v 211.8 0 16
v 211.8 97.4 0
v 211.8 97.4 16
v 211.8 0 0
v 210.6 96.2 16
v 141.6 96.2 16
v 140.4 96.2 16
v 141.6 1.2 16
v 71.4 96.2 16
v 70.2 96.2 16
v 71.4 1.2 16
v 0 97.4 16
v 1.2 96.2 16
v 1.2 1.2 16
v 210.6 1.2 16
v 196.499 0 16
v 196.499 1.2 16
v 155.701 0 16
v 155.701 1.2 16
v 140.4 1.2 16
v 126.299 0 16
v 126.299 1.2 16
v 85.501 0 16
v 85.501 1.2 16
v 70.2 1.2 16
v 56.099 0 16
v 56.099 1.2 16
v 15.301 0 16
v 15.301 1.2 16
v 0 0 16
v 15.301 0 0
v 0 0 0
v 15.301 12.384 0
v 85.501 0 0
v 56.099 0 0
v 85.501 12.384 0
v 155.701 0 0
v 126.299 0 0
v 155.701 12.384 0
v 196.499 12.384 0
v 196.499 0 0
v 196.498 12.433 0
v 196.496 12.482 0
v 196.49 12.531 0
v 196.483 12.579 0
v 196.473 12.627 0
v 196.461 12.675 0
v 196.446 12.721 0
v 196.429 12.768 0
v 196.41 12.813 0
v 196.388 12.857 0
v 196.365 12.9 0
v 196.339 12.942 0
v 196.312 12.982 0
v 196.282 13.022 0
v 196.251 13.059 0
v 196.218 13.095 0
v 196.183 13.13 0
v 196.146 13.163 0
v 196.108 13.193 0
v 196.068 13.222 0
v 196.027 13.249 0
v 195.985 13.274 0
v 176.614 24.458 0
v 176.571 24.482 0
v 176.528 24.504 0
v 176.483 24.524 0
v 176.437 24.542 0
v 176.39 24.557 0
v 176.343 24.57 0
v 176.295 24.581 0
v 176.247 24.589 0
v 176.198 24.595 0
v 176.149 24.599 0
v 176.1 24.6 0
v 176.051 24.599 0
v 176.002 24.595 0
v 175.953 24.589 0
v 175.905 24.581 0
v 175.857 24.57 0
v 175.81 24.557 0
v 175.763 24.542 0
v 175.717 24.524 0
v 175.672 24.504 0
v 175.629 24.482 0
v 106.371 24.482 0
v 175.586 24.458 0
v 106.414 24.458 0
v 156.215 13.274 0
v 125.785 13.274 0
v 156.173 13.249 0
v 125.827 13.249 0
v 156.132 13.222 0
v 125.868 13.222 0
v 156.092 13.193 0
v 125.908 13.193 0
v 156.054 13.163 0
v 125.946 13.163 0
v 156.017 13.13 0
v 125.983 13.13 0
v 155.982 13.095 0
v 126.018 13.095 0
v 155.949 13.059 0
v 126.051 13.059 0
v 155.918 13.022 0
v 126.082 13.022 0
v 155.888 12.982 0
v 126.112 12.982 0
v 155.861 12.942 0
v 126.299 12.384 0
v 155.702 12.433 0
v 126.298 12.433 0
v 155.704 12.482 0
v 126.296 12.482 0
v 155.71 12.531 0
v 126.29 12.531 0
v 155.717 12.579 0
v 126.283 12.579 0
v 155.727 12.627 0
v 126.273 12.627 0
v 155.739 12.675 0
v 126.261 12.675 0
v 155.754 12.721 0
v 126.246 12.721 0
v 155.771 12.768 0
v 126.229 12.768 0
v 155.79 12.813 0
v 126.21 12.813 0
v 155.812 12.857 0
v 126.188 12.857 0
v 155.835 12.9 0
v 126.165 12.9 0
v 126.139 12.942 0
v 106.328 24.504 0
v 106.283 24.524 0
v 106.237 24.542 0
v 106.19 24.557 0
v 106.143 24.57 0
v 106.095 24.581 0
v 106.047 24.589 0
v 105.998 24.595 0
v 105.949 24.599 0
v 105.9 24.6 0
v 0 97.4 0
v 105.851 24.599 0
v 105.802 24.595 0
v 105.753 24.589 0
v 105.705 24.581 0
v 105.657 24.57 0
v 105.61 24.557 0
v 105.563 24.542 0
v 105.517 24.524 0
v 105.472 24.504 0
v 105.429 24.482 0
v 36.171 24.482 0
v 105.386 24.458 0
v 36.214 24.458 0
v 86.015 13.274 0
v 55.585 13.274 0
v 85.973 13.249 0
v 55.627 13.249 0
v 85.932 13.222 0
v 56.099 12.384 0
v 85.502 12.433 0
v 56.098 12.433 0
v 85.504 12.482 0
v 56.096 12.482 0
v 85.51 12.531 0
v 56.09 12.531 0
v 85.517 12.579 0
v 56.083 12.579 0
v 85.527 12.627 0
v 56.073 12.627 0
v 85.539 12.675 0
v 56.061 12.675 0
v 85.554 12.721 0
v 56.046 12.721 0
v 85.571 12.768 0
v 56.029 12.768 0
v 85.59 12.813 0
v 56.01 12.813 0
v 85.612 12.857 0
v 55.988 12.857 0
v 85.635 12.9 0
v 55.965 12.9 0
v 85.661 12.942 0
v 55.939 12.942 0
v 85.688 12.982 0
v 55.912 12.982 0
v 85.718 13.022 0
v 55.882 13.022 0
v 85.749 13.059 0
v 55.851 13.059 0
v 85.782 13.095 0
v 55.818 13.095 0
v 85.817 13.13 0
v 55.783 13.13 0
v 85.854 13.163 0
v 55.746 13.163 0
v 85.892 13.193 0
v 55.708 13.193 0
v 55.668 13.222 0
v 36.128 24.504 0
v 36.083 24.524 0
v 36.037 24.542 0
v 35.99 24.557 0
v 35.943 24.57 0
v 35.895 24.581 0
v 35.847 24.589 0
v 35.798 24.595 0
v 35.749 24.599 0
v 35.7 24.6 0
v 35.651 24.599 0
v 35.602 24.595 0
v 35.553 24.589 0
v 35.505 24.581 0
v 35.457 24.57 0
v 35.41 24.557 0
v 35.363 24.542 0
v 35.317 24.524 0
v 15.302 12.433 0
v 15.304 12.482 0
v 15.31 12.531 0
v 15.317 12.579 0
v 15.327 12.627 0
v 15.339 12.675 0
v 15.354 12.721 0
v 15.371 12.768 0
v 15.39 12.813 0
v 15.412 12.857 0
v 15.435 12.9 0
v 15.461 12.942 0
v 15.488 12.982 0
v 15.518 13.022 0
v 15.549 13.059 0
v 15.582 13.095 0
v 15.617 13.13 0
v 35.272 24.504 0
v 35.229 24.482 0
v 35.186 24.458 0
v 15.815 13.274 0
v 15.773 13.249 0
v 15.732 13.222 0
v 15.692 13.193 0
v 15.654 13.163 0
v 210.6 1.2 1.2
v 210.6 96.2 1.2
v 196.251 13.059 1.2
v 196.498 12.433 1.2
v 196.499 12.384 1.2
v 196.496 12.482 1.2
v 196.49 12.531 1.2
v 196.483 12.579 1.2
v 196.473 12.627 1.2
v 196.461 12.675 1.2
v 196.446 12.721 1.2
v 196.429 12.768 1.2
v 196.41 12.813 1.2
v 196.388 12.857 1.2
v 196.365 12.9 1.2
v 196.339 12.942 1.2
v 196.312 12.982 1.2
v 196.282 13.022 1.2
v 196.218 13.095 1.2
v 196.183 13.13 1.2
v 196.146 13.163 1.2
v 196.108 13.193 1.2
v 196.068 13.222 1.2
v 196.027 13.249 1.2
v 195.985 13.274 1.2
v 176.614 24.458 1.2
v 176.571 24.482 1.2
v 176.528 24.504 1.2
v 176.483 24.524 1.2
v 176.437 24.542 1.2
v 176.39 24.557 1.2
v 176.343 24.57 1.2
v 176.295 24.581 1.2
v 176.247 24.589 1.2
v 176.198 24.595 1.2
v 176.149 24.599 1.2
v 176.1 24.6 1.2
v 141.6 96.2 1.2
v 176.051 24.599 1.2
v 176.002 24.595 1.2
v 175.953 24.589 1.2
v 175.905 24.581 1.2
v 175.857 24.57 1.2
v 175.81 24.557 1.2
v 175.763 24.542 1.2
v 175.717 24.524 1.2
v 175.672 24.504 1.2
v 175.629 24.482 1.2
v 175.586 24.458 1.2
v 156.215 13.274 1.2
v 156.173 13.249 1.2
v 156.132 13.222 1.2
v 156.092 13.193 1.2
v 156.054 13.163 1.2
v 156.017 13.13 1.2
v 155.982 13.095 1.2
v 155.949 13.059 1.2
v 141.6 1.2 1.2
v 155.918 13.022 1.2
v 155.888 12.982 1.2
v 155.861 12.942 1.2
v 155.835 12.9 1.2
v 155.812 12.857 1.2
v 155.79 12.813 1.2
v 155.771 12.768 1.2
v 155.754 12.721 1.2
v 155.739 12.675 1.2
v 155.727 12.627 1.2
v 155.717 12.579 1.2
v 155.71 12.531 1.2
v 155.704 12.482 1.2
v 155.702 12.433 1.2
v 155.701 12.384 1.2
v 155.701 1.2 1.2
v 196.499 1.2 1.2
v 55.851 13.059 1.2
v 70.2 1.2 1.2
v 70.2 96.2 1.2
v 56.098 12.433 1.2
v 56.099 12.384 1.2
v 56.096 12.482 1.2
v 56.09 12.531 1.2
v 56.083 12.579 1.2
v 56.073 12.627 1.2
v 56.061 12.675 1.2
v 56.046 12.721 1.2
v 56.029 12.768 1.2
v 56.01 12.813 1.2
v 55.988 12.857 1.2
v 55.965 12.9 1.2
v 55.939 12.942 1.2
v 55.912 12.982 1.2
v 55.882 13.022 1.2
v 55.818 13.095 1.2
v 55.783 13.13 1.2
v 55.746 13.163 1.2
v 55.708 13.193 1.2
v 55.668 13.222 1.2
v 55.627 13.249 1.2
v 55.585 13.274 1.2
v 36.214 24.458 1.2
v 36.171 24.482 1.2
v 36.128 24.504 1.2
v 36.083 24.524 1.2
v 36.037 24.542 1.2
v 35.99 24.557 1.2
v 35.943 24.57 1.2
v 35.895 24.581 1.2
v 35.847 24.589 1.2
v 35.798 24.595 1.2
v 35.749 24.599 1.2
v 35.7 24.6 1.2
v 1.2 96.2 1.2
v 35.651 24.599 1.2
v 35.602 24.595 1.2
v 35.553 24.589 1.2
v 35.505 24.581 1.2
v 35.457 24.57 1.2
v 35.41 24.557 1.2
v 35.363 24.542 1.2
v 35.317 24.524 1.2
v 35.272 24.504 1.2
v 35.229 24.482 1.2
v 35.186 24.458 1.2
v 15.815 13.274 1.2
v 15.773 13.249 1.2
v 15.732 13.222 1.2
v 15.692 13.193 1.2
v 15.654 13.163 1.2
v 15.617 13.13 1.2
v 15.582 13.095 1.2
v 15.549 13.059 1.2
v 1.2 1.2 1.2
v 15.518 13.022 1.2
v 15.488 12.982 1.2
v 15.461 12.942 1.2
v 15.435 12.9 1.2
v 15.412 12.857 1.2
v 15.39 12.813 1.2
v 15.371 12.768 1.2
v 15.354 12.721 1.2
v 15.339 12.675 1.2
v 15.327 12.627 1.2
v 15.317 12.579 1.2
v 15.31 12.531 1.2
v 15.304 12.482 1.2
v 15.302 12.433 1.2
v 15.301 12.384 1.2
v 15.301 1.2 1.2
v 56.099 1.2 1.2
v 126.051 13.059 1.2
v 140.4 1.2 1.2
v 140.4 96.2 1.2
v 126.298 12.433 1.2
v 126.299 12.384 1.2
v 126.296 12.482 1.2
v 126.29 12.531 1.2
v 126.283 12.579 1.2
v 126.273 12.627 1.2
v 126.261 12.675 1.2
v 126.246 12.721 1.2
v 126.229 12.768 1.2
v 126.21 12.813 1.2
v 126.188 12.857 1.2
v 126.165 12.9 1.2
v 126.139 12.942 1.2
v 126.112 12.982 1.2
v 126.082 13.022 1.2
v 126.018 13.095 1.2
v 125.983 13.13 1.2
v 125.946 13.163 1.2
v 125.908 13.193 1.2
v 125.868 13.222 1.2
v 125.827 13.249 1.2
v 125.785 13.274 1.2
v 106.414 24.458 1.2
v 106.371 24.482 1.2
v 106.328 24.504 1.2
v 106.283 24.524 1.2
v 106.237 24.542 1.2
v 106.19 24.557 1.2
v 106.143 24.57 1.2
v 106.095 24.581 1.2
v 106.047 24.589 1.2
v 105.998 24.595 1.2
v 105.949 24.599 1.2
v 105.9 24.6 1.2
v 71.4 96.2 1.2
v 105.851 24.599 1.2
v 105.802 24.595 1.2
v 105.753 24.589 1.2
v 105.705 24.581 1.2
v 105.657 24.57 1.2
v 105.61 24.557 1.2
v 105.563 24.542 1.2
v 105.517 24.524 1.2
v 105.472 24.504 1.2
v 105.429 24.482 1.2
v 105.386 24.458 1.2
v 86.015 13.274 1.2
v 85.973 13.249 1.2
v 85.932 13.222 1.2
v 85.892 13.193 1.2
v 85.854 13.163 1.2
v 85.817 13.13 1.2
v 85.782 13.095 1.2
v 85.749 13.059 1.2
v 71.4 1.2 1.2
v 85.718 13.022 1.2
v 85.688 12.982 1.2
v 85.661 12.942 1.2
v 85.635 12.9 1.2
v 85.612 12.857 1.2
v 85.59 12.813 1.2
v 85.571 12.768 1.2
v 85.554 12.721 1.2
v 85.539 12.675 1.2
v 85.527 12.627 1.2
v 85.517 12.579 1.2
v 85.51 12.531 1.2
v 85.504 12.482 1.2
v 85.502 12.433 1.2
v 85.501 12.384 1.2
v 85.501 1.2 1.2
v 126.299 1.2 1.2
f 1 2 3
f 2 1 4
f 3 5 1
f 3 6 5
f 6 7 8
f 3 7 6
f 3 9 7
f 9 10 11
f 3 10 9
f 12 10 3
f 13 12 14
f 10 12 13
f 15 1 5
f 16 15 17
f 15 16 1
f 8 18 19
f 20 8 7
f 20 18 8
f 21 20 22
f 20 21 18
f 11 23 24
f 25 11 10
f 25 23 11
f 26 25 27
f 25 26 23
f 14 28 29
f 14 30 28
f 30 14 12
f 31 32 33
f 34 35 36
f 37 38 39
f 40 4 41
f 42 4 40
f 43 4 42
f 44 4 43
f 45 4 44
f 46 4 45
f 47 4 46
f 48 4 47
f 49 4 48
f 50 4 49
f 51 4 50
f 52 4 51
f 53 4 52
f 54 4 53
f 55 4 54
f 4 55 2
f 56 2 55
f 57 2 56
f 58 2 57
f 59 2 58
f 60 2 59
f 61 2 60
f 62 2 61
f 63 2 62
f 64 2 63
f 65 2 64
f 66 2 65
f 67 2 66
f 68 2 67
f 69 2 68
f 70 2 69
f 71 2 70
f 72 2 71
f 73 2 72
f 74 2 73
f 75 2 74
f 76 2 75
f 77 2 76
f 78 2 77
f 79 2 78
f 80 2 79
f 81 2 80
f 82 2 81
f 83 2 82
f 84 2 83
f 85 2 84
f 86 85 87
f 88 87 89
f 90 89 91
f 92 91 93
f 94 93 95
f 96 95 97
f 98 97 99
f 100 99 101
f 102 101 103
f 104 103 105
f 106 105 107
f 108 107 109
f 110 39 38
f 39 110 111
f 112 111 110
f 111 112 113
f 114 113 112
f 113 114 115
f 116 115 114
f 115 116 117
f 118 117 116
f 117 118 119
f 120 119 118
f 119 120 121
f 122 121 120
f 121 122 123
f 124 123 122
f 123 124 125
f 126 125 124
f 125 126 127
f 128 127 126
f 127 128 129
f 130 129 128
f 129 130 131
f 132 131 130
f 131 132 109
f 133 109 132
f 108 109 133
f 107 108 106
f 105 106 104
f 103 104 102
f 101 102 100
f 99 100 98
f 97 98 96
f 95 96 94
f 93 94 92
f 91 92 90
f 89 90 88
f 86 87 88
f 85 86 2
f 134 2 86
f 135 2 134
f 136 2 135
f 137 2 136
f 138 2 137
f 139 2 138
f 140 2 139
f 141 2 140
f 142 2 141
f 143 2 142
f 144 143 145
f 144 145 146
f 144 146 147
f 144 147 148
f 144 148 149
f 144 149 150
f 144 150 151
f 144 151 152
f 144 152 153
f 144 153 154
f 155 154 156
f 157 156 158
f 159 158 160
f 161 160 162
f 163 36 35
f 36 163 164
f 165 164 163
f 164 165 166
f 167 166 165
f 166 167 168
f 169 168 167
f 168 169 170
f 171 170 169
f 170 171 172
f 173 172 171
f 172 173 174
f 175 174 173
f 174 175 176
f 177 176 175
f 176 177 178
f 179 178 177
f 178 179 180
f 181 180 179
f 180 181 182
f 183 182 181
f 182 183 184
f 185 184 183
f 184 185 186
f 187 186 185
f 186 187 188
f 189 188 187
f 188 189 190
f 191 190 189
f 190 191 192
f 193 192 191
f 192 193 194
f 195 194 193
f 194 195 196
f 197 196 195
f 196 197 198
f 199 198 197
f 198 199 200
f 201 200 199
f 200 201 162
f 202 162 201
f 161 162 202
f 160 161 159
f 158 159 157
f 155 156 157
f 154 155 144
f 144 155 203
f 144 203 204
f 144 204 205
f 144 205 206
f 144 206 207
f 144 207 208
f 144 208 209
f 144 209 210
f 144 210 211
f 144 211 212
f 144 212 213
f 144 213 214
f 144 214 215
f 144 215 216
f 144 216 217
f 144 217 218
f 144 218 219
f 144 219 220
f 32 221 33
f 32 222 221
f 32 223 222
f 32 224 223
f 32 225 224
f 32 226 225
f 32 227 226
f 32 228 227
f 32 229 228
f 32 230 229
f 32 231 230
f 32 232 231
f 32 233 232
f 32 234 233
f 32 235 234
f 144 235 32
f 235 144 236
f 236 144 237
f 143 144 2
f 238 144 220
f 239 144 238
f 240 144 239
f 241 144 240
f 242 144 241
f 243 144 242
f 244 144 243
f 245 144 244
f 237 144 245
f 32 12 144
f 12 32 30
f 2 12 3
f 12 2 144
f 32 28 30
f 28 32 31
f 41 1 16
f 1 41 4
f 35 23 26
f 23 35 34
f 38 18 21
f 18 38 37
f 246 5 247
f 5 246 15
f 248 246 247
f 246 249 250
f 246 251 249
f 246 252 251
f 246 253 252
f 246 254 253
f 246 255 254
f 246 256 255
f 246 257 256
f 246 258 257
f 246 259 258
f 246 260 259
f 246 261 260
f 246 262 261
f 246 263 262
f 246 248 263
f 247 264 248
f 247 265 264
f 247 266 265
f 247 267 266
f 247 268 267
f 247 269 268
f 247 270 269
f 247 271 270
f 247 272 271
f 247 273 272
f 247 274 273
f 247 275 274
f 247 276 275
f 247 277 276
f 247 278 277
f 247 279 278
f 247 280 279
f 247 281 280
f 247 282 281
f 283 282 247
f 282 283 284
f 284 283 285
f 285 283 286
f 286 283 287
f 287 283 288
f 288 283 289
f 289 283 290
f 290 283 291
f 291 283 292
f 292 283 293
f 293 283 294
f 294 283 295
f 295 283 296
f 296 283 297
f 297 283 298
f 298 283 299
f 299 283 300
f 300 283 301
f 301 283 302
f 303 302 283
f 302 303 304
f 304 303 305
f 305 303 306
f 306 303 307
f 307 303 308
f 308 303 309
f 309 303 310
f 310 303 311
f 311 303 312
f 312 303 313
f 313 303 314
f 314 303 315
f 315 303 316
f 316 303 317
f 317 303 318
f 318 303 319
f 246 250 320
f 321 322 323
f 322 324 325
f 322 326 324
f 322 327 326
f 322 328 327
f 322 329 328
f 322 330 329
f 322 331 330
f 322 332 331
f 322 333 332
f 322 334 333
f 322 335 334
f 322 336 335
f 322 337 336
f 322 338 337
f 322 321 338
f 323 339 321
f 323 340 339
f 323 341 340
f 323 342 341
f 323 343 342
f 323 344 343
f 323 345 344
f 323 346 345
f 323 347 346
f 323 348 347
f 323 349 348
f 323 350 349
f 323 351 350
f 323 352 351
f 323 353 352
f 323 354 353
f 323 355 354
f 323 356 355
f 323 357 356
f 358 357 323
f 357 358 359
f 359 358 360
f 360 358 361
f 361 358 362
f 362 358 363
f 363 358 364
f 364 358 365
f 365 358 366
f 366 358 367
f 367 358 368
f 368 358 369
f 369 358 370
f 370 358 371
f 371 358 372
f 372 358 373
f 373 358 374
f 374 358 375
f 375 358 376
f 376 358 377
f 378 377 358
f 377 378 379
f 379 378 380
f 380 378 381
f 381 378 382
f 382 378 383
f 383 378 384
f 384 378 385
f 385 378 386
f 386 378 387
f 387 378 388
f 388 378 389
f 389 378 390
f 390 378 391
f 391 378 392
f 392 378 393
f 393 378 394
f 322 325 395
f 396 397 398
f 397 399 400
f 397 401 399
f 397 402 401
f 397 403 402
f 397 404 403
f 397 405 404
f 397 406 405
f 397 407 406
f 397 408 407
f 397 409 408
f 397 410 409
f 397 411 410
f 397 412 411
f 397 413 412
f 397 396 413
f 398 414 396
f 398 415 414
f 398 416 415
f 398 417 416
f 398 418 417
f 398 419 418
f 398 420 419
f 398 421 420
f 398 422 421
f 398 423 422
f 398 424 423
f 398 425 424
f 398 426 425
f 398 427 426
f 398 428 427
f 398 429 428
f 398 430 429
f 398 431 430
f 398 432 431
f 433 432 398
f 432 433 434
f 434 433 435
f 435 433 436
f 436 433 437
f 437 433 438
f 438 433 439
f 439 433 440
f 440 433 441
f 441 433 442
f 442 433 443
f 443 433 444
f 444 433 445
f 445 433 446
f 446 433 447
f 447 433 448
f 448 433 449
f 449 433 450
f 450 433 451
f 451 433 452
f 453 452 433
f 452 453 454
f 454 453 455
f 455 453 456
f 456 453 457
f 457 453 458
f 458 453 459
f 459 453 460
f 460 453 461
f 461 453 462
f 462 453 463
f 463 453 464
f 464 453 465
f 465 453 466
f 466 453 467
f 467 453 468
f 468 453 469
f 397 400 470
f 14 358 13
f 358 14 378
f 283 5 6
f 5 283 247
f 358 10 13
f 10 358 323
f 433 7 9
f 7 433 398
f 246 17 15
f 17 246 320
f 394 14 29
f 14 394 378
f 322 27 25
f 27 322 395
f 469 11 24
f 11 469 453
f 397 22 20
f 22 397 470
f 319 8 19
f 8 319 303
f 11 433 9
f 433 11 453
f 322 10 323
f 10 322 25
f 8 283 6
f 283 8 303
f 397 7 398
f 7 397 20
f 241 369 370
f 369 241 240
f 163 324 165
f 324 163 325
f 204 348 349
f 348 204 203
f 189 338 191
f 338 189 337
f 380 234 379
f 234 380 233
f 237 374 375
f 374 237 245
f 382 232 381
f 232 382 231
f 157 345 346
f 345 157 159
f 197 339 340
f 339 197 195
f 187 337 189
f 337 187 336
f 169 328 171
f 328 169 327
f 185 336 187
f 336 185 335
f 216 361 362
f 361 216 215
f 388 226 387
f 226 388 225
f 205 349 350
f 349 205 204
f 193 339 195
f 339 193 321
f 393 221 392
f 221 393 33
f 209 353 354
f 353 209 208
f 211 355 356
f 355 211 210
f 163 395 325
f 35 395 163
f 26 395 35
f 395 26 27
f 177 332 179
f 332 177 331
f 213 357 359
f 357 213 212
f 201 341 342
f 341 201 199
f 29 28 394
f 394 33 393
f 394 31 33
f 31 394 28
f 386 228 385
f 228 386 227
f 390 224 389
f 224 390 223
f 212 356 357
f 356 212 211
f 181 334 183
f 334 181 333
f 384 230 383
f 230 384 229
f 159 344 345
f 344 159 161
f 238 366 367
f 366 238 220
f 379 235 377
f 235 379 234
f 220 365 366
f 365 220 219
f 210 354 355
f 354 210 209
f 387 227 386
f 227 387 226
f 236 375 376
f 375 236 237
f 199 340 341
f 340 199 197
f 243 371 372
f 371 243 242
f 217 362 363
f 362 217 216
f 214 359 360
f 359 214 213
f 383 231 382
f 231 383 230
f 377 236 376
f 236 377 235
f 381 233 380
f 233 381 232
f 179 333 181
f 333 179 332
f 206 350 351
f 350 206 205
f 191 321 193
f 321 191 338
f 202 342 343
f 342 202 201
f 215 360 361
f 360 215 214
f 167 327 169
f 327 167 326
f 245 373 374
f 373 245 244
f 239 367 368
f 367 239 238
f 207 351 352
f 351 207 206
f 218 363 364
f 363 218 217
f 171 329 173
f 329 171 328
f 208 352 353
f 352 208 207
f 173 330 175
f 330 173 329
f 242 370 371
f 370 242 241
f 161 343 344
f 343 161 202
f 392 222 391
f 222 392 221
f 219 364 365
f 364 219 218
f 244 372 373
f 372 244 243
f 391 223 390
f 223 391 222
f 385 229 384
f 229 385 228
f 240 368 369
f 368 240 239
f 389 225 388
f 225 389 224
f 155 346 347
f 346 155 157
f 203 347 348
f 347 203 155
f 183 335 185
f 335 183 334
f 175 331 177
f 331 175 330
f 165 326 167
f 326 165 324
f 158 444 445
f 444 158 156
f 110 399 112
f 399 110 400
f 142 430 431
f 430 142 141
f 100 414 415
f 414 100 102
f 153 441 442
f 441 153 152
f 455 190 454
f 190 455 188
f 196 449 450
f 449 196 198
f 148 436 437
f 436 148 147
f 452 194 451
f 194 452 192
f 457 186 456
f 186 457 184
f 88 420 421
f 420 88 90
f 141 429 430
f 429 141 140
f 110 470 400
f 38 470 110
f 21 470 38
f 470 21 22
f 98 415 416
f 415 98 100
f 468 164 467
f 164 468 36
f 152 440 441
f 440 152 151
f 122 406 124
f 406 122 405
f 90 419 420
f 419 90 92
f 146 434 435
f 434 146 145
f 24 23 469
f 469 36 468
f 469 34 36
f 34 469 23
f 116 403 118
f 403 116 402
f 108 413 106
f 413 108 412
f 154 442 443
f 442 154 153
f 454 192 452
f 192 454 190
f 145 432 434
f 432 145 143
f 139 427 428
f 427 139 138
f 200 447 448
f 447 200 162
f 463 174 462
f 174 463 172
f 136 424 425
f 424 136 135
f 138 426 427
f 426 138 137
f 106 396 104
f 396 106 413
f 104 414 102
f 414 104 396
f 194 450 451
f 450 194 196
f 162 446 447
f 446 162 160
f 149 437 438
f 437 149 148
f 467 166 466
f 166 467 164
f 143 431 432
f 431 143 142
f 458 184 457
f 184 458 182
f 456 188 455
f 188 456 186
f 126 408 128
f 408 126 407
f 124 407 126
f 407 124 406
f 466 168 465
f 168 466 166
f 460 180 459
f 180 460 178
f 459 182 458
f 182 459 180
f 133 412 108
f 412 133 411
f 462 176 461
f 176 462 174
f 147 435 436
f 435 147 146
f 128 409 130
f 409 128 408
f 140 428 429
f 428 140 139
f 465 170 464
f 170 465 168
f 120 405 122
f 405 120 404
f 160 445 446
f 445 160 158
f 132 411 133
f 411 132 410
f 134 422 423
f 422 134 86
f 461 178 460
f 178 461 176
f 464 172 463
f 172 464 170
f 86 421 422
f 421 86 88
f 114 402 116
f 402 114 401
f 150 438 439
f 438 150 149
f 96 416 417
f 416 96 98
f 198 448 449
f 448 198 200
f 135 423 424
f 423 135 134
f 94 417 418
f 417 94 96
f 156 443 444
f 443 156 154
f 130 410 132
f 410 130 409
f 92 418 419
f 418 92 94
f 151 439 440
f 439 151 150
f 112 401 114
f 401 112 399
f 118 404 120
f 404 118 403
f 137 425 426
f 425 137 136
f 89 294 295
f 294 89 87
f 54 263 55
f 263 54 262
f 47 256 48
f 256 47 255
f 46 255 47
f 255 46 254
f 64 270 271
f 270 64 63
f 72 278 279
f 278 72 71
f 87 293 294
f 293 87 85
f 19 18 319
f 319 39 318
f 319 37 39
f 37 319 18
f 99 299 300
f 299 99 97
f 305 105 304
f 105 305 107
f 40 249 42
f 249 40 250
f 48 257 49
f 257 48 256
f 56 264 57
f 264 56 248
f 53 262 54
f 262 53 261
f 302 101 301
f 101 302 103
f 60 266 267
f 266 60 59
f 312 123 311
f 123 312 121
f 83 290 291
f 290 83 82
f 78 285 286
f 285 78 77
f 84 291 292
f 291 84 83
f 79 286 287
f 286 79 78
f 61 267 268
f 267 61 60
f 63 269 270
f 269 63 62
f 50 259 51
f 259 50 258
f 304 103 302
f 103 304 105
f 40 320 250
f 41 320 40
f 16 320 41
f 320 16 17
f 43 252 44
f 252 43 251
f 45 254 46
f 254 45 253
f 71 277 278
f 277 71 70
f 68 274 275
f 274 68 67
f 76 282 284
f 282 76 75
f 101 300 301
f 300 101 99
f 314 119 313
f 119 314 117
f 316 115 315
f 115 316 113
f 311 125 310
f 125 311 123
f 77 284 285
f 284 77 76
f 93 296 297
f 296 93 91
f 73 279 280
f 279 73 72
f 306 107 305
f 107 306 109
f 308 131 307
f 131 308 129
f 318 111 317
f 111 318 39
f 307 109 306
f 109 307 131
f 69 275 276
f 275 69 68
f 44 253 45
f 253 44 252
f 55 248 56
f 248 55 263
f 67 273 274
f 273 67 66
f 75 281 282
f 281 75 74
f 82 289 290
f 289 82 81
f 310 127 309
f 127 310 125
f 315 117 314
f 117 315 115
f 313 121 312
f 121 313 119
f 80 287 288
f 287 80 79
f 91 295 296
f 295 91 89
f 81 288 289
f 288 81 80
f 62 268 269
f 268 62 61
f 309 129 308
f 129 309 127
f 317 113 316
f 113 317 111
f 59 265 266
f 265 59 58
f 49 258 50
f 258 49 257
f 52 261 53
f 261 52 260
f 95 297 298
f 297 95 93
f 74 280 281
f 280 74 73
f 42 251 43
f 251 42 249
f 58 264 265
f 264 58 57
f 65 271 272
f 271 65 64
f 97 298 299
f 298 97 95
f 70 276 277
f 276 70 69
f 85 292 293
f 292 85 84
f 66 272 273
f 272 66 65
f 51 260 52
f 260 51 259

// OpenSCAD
// file: ../../internal/tray.scad
// Copyright 2023 Joshua Star, All Rights Reserved

include <base.scad>
include <prim.scad>

module tray_basic(inner_size, r=0, thickness=DEFAULT_THICKNESS, bottom_thickness=undef) {

	half_z = inner_size.z / 2;
	radius = min(r, half_z);

	bottom_thk = bottom_thickness != undef ? bottom_thickness : thickness;

	thk2 = thickness * 2;

	outer_size = inner_size + [thk2, thk2, bottom_thk];
	echo("tray outer dimensions are: ", outer_size);

	inner_radius = radius - thickness;

	union() {
		difference() {
			// outer shell
			if (0 < r) {
				union() {
					translate([0, 0, bottom_thk])
						cylinder_cube([outer_size.x, outer_size.y, outer_size.z - bottom_thk], r=radius);
					cylinder_cube([outer_size.x, outer_size.y, bottom_thk], inner_radius, radius);
				}
			}
			else {
				cube(outer_size);
			}
			
			// lip cutout
			if (0 < radius) {
				translate([0, 0, inner_size.z + SMALL_NUM])
					cylinder_cube([outer_size.x, outer_size.y, bottom_thk], r1=inner_radius, r2=radius);
			}

			// inner cutout
			if (0 < radius) {
				translate([thickness, thickness, bottom_thk])
					rounded_cube(inner_size + [0, 0, bottom_thk], r=inner_radius, flat_top=true);
			}
			else {
				translate([thickness, thickness, bottom_thk])
						cube(inner_size + [0, 0, bottom_thk]);
			}
		}
	}
}

module tray_divided(size, r=0, div_x=1, div_y=1, thickness=DEFAULT_THICKNESS, bottom_thickness=undef, div_height=undef, div_thickness=undef) {

	bottom_thk = bottom_thickness != undef ? bottom_thickness : thickness;

	div_thk = div_thickness != undef ? div_thickness : thickness;
	div_z = div_height != undef ? div_height : size.z;

	max_div_z = 0 == r ? size.z : size.z - bottom_thk;
	clamped_div_z = min(div_z, max_div_z);

	x_minus_div = size.x - (div_thk * (div_x - 1));
	y_minus_div = size.y - (div_thk * (div_y - 1));

	x_off = (x_minus_div / div_x) + div_thk;
	y_off = (y_minus_div / div_y) + div_thk;
	
	union() {
		tray_basic(size, r=r, thickness=thickness, bottom_thickness=bottom_thk);

		// columns, along x
		for (i=[1:1:div_x-1]) {
			translate([i * x_off, thickness, bottom_thk])
				cube([div_thk, size.y, clamped_div_z]);
		}

		// rows, along y
		for (i=[1:1:div_y-1]) {
			translate([thickness, i * y_off, bottom_thk])
				cube([size.x, div_thk, clamped_div_z]);
		}
	}
}

module notch_cutter(h, r) {
	n = 6;
	rotate([0, 0, 180 / n]) cylinder_ngon(2 * r, h, n);
}

module tray_notched(size, div_x=1, div_y=1, thickness=DEFAULT_THICKNESS, bottom_thickness=undef, div_height=undef, div_thickness=undef, notch_lo_x=true, notch_hi_x=true) {

	bottom_thk = bottom_thickness != undef ? bottom_thickness : thickness;

	div_thk = div_thickness != undef ? div_thickness : thickness;
	div_z = div_height != undef ? div_height : size.z;

	x_minus_div = size.x - (div_thk * (div_x - 1));

	x_off = (x_minus_div / div_x) + div_thk;
	
	div_bias = (div_thk - x_off) / 2;

	notch_h = size.z + bottom_thk + 2 * SMALL_NUM;
	notch_r = x_off / 3;

	difference() {
		tray_divided(size, div_x=div_x, div_y=div_y, thickness=thickness, bottom_thickness=bottom_thk, div_height=div_z, div_thickness=div_thk);

		// notch along x
		for (i=[1:1:div_x]) {

			if (notch_lo_x) {
				translate([i * x_off + div_bias, thickness, -SMALL_NUM])
					notch_cutter(notch_h, notch_r);
			}

			if (notch_hi_x) {
				translate([i * x_off + div_bias, size.y + thickness, -SMALL_NUM])
					notch_cutter(notch_h, notch_r);
			}
		}
	}
}

// --- TESTING ---

//tray_basic([240, 120, 30], r=4);

//translate([-1.2, -1.2, 0]) tray_divided([200, 100, 5], div_x=20, div_y=10);
//tray_divided([180, 120, 30], r=15, div_x=3, div_y=2, div_height=25);

//translate([-1.2, -1.2, 0]) tray_notched([200, 100, 30], div_x=20, div_y=10);
// file: ../../internal/prim.scad
// Copyright 2023 Joshua Star, All Rights Reserved

module cylinder_cube(size, r1=1, r2=1, r=undef) {
	r1 = r != undef ? r : r1;
	r2 = r != undef ? r : r2;

	r_max = max(r1, r2);
	hull() {
		translate([r_max, r_max, 0])
			cylinder(size.z, r1, r2);
		translate([size.x - r_max, r_max, 0])
			cylinder(size.z, r1, r2);
		translate([r_max, size.y - r_max, 0])
			cylinder(size.z, r1, r2);
		translate([size.x - r_max, size.y - r_max, 0])
			cylinder(size.z, r1, r2);
	}
}

module cylinder_ngon(width, h, n=6, r=1) {
	hull() {
		for (i=[0:1:n-1]) {
			angl_off = 360 / n;
			posx_off = width / 2 - r;
			rotate([0, 0, i * angl_off]) translate([posx_off, 0, 0])
				cylinder(r=r, h=h);
		}
	}
}

module cylinder_trap(size, ratio, radius=1) {
	hull() {
		half_size_x = size.x / 2;
		translate([radius - half_size_x, radius, 0])
			cylinder(r=radius, h=size.z);
		translate([half_size_x - radius, radius, 0])
			cylinder(r=radius, h=size.z);
		translate([radius - ratio * half_size_x, size.y - radius, 0])
			cylinder(r=radius, h=size.z);
		translate([ratio * half_size_x - radius, size.y - radius, 0])
			cylinder(r=radius, h=size.z);
	}
}

module rounded_cube(size, r=1, flat_top=false) {
	
	half_z = size.z / 2;
	radius = min(r, half_z);
	
	hull() {
		// bottom 'points'
		translate([radius,radius,radius]) sphere(r=radius);
		translate([size.x-radius,radius,radius]) sphere(r=radius);
		translate([radius,size.y-radius,radius]) sphere(r=radius);
		translate([size.x-radius,size.y-radius,radius]) sphere(r=radius);

		// top 'points'
		pos_z = size.z - radius;
		if (flat_top) {
			translate([radius, radius, pos_z]) cylinder(r=radius, h=radius);
			translate([size.x-radius, radius, pos_z]) cylinder(r=radius, h=radius);
			translate([radius, size.y-radius, pos_z]) cylinder(r=radius, h=radius);
			translate([size.x-radius, size.y-radius, pos_z]) cylinder(r=radius, h=radius);
		}
		else {
			translate([radius, radius, pos_z]) sphere(r=radius);
			translate([size.x-radius, radius, pos_z]) sphere(r=radius);
			translate([radius, size.y-radius, pos_z]) sphere(r=radius);
			translate([size.x-radius, size.y-radius, pos_z]) sphere(r=radius);
		}
	}
}

// --- TESTING ---

//cylinder_cube([240, 120, 30], r=8);

//cylinder_cube([240, 120, 16], r1=4, r2=8);
//cylinder_cube([240, 120, 16], r1=8, r2=4);

//cylinder_ngon(10, 5, 7, 1);

//cylinder_trap([100, 50, 30], 0.5, radius=8);

//rounded_cube([240, 120, 30], r=12);
//rounded_cube([240, 120, 30], r=12, flat_top=true);
//rounded_cube([240, 120, 30], r=30, flat_top=true);
// file: ../../internal/math.scad
// Copyright 2023 Joshua Star, All Rights Reserved

function clamp(x, lower, upper) = x < lower ? lower : (upper < x ? upper : x);
function lerp(lower, upper, s) = (upper - lower) * s + lower;
// file: ../../internal/card.scad
// Copyright 2023 Joshua Star, All Rights Reserved

TOLERANCE_MIN = [0.4, 0.4];
TOLERANCE_MAX = [0.8, 0.8];

function std_card_dim() = [67, 93] + TOLERANCE_MIN; // gray
function amer_card_dim() = [59, 91] + TOLERANCE_MIN; // green
function euro_card_dim() = [62, 94] + TOLERANCE_MIN; // purple

function mini_amer_card_dim() = [44, 67] + TOLERANCE_MIN; // yellow
function mini_euro_card_dim() = [46, 71] + TOLERANCE_MIN; // ruby

function 7won_card_dim() = [67, 103] + TOLERANCE_MAX; // brown
function tarot_card_dim() = [73, 122] + TOLERANCE_MAX; // orange

function per_card_thickness() = 0.68;

function calc_card_stack(n, padding=1.2) = n * per_card_thickness() + padding;
function calc_card_count(d, padding=1.2) = (d - padding) / per_card_thickness();
// file: ../../internal/boxes.scad
// Copyright 2023 Joshua Star, All Rights Reserved

function gamebox_common() = [286, 286, 68]; // Terraforming Mars, Wingspan

function gamebox_ffg_10() = [254, 254, 48]; // Cave Troll, Drakon (4th ed), Elder Sign
function gamebox_ffg_11() = [290, 290, 70]; // 11.5 in.
function gamebox_ffg_revised_lcg() = [280, 238, 70]; // Marvel Champions
// file: ../../internal/base.scad
// Copyright 2023 Joshua Star, All Rights Reserved

fn = $preview ? 16 : 128;
$fn = fn;

SMALL_NUM = $preview ? 0.02 : 0.001;

DEFAULT_PADDING = 1.6;
DEFAULT_THICKNESS = 1.2;

function default_padding() = DEFAULT_PADDING;
function default_thickness() = DEFAULT_THICKNESS;

function make_list(v, n) = [for(i=[0:n-1]) v];
function sum_list(v) = [for(p=v) 1] * v;
// file: ../../boardgame_tk.scad
// Copyright 2023 Joshua Star, All Rights Reserved

include <internal/base.scad>
include <internal/boxes.scad>
include <internal/card.scad>
include <internal/math.scad>
include <internal/prim.scad>
include <internal/tray.scad>

module card_display(card_size, height, num_stacks, padding=DEFAULT_PADDING, thickness=DEFAULT_THICKNESS, bottom_thickness=undef, div_thickness=undef) {

	div_thk = div_thickness != undef ? div_thickness : thickness;

	dim_x = (card_size.x + padding) * num_stacks + (div_thk * (num_stacks - 1));
	dim_y = card_size.y + padding;
	dim_z = height;

	tray_notched([dim_x, dim_y, dim_z], div_x=num_stacks, thickness=thickness, bottom_thickness=bottom_thickness, div_thickness=div_thickness, notch_hi_x=false);
}

module vertical_cutter(size, r=0.5) {
	difference() {
		translate([0, size.z, 0]) rotate([90, 0, 0])
		linear_extrude(height=size.z) {
			translate([0, r, 0])
			offset(r=-r) {
				offset(r=2*r) {
					union() {
						translate([-(size.x + 2 * r) / 2, 0, 0]) square([size.x + 2 * r, 1]);
						translate([-(size.x - 2 * r)/2, -size.y, 0]) square([size.x - 2 * r, size.y]);
					}
				}
			}
		}

		translate([-(size.x + r), -size.z, 0])
			cube([2 * (size.x + r), 3 * size.z, 2 * (size.y + r)]);
	}
}

module card_tray(card_size, stacks, num_columns=1, padding=[0.8, 0.8, 0.8], thickness=DEFAULT_THICKNESS, bottom_thickness=undef, div_height=undef, div_thickness=undef) {

	bottom_thk = bottom_thickness != undef ? bottom_thickness : thickness;

	div_thk = div_thickness != undef ? div_thickness : thickness;

	col_dim_x = card_size.y + padding.x;

	dim_x = col_dim_x * num_columns + div_thk * (num_columns - 1);
	dim_y = sum_list(stacks) + (div_thk + padding.y) * (len(stacks) - 1);
	dim_z = card_size.x + padding.z;

	div_z = div_height != undef ? div_height : dim_z;

	min_card_dim = min(card_size.x, card_size.y);
	cutter_radius = min_card_dim / 6;

	difference() {
		union() {
			tray_divided([dim_x, dim_y, dim_z], div_x=num_columns, thickness=thickness, bottom_thickness=bottom_thickness);

			div_offsets = [
				for (a=0, b=stacks[0]; a < (len(stacks) - 1); a = a + 1, b = b + (stacks[a]==undef?0:stacks[a]) + padding.y + div_thk)
					b
				];

			// columns, along x
			for (c=[0:1:num_columns-1]) {
				// rows, along y
				for (y=div_offsets) {
					x_off = c * (col_dim_x + div_thk) + thickness;

					translate([x_off, y, bottom_thk])
						cube([col_dim_x, div_thk, div_z]);
				}
			}
		}

		cutout_size = [col_dim_x / 2, dim_z / 2, thickness + 2 * SMALL_NUM];
		cutout_z = bottom_thk + dim_z + SMALL_NUM;

		// cutout
		for (c=[0:1:num_columns-1]) {
			n = 8;

			x_off = c * (col_dim_x + div_thk) + (col_dim_x / 2) + thickness;

			// front cut
			translate([x_off, -SMALL_NUM, cutout_z])
					vertical_cutter(cutout_size, r=cutter_radius);
			
			// back cut
			translate([x_off, dim_y + thickness - SMALL_NUM, cutout_z])
					vertical_cutter(cutout_size, r=cutter_radius);
			
			// middle cut
			translate([x_off, thickness, bottom_thk + div_z + SMALL_NUM])
					vertical_cutter([cutout_size.x, div_z / 2, dim_y], r=cutter_radius);
		}
	}
}

module spacer(size, r=16, div_x=2, div_y=2, spacing=16) {
	difference() {
		cylinder_cube(size, r=r);

		half_spacing = spacing / 2;
		inner_radius = r - half_spacing;

		offset_x = size.x / div_x;
		offset_y = size.y / div_y;
		for (i=[0:1:div_x]) {
			for (j=[0:1:div_y]) {
				translate([i * offset_x + half_spacing, j * offset_y + half_spacing, -1])
				cylinder_cube([
					size.x / div_x - spacing,
					size.y / div_y - spacing,
					size.z + 2], r=inner_radius);
			}
		}
	}
}

module pegs_grid(rows=1, cols=1, radius=1, height=1, spacing=1, alt_pack=false) {
	x_start = spacing + radius;
	y_start = spacing + radius;

	x_alt_start = radius + spacing / 2;

	x_offset = 2 * radius + spacing;
	y_offset = alt_pack ? ((radius + spacing / 2) * sqrt(3)) : 2 * radius + spacing;

	for (r=[0:1:rows-1]) {
		is_alt = alt_pack ? (r % 2) : 0;
		for (c=[0:1:cols-(1 + is_alt)]) {
			translate([
					c * x_offset + x_start + x_alt_start * is_alt,
					r * y_offset + y_start,
					0])
				cylinder(h=height, r=radius);
		}
	}
}

module peg_board(rows=1, cols=1, radius=1, height=1, spacing=1) {
	difference() {
		cylinder_cube([
			cols * 2 * radius + (cols + 1) * spacing,
			rows * 2 * radius + (rows + 1) * spacing,
			height], r=radius);

		translate([0, 0, -height/2])
			pegs_grid(rows=rows, cols=cols, radius=radius, height=2*height, spacing=spacing, alt_pack=false);
	}
}

// --- TESTING ---

//card_display(mini_euro_card_dim(), 30, 3);

//vertical_cutter([100,50, 10], r=10);

//card_tray(std_card_dim(), [30, 30, 8, 8, 8, 16, 42], num_columns=4, div_height=55);

//spacer([240, 120, 10], r=16, div_x=4, div_y=3, spacing=8);

//pegs_grid(rows=4, cols=5, radius=32, height=4, spacing=6, alt_pack=false);
//pegs_grid(rows=4, cols=5, radius=32, height=4, spacing=6, alt_pack=true);

//peg_board(rows=3, cols=4, radius=28, height=4, spacing=6);
// main file
// Copyright 2023 Joshua Star, All Rights Reserved

use <../../boardgame_tk.scad>

slots = 3;

depth = calc_card_stack(20);

card_display(std_card_dim(), depth, slots);
